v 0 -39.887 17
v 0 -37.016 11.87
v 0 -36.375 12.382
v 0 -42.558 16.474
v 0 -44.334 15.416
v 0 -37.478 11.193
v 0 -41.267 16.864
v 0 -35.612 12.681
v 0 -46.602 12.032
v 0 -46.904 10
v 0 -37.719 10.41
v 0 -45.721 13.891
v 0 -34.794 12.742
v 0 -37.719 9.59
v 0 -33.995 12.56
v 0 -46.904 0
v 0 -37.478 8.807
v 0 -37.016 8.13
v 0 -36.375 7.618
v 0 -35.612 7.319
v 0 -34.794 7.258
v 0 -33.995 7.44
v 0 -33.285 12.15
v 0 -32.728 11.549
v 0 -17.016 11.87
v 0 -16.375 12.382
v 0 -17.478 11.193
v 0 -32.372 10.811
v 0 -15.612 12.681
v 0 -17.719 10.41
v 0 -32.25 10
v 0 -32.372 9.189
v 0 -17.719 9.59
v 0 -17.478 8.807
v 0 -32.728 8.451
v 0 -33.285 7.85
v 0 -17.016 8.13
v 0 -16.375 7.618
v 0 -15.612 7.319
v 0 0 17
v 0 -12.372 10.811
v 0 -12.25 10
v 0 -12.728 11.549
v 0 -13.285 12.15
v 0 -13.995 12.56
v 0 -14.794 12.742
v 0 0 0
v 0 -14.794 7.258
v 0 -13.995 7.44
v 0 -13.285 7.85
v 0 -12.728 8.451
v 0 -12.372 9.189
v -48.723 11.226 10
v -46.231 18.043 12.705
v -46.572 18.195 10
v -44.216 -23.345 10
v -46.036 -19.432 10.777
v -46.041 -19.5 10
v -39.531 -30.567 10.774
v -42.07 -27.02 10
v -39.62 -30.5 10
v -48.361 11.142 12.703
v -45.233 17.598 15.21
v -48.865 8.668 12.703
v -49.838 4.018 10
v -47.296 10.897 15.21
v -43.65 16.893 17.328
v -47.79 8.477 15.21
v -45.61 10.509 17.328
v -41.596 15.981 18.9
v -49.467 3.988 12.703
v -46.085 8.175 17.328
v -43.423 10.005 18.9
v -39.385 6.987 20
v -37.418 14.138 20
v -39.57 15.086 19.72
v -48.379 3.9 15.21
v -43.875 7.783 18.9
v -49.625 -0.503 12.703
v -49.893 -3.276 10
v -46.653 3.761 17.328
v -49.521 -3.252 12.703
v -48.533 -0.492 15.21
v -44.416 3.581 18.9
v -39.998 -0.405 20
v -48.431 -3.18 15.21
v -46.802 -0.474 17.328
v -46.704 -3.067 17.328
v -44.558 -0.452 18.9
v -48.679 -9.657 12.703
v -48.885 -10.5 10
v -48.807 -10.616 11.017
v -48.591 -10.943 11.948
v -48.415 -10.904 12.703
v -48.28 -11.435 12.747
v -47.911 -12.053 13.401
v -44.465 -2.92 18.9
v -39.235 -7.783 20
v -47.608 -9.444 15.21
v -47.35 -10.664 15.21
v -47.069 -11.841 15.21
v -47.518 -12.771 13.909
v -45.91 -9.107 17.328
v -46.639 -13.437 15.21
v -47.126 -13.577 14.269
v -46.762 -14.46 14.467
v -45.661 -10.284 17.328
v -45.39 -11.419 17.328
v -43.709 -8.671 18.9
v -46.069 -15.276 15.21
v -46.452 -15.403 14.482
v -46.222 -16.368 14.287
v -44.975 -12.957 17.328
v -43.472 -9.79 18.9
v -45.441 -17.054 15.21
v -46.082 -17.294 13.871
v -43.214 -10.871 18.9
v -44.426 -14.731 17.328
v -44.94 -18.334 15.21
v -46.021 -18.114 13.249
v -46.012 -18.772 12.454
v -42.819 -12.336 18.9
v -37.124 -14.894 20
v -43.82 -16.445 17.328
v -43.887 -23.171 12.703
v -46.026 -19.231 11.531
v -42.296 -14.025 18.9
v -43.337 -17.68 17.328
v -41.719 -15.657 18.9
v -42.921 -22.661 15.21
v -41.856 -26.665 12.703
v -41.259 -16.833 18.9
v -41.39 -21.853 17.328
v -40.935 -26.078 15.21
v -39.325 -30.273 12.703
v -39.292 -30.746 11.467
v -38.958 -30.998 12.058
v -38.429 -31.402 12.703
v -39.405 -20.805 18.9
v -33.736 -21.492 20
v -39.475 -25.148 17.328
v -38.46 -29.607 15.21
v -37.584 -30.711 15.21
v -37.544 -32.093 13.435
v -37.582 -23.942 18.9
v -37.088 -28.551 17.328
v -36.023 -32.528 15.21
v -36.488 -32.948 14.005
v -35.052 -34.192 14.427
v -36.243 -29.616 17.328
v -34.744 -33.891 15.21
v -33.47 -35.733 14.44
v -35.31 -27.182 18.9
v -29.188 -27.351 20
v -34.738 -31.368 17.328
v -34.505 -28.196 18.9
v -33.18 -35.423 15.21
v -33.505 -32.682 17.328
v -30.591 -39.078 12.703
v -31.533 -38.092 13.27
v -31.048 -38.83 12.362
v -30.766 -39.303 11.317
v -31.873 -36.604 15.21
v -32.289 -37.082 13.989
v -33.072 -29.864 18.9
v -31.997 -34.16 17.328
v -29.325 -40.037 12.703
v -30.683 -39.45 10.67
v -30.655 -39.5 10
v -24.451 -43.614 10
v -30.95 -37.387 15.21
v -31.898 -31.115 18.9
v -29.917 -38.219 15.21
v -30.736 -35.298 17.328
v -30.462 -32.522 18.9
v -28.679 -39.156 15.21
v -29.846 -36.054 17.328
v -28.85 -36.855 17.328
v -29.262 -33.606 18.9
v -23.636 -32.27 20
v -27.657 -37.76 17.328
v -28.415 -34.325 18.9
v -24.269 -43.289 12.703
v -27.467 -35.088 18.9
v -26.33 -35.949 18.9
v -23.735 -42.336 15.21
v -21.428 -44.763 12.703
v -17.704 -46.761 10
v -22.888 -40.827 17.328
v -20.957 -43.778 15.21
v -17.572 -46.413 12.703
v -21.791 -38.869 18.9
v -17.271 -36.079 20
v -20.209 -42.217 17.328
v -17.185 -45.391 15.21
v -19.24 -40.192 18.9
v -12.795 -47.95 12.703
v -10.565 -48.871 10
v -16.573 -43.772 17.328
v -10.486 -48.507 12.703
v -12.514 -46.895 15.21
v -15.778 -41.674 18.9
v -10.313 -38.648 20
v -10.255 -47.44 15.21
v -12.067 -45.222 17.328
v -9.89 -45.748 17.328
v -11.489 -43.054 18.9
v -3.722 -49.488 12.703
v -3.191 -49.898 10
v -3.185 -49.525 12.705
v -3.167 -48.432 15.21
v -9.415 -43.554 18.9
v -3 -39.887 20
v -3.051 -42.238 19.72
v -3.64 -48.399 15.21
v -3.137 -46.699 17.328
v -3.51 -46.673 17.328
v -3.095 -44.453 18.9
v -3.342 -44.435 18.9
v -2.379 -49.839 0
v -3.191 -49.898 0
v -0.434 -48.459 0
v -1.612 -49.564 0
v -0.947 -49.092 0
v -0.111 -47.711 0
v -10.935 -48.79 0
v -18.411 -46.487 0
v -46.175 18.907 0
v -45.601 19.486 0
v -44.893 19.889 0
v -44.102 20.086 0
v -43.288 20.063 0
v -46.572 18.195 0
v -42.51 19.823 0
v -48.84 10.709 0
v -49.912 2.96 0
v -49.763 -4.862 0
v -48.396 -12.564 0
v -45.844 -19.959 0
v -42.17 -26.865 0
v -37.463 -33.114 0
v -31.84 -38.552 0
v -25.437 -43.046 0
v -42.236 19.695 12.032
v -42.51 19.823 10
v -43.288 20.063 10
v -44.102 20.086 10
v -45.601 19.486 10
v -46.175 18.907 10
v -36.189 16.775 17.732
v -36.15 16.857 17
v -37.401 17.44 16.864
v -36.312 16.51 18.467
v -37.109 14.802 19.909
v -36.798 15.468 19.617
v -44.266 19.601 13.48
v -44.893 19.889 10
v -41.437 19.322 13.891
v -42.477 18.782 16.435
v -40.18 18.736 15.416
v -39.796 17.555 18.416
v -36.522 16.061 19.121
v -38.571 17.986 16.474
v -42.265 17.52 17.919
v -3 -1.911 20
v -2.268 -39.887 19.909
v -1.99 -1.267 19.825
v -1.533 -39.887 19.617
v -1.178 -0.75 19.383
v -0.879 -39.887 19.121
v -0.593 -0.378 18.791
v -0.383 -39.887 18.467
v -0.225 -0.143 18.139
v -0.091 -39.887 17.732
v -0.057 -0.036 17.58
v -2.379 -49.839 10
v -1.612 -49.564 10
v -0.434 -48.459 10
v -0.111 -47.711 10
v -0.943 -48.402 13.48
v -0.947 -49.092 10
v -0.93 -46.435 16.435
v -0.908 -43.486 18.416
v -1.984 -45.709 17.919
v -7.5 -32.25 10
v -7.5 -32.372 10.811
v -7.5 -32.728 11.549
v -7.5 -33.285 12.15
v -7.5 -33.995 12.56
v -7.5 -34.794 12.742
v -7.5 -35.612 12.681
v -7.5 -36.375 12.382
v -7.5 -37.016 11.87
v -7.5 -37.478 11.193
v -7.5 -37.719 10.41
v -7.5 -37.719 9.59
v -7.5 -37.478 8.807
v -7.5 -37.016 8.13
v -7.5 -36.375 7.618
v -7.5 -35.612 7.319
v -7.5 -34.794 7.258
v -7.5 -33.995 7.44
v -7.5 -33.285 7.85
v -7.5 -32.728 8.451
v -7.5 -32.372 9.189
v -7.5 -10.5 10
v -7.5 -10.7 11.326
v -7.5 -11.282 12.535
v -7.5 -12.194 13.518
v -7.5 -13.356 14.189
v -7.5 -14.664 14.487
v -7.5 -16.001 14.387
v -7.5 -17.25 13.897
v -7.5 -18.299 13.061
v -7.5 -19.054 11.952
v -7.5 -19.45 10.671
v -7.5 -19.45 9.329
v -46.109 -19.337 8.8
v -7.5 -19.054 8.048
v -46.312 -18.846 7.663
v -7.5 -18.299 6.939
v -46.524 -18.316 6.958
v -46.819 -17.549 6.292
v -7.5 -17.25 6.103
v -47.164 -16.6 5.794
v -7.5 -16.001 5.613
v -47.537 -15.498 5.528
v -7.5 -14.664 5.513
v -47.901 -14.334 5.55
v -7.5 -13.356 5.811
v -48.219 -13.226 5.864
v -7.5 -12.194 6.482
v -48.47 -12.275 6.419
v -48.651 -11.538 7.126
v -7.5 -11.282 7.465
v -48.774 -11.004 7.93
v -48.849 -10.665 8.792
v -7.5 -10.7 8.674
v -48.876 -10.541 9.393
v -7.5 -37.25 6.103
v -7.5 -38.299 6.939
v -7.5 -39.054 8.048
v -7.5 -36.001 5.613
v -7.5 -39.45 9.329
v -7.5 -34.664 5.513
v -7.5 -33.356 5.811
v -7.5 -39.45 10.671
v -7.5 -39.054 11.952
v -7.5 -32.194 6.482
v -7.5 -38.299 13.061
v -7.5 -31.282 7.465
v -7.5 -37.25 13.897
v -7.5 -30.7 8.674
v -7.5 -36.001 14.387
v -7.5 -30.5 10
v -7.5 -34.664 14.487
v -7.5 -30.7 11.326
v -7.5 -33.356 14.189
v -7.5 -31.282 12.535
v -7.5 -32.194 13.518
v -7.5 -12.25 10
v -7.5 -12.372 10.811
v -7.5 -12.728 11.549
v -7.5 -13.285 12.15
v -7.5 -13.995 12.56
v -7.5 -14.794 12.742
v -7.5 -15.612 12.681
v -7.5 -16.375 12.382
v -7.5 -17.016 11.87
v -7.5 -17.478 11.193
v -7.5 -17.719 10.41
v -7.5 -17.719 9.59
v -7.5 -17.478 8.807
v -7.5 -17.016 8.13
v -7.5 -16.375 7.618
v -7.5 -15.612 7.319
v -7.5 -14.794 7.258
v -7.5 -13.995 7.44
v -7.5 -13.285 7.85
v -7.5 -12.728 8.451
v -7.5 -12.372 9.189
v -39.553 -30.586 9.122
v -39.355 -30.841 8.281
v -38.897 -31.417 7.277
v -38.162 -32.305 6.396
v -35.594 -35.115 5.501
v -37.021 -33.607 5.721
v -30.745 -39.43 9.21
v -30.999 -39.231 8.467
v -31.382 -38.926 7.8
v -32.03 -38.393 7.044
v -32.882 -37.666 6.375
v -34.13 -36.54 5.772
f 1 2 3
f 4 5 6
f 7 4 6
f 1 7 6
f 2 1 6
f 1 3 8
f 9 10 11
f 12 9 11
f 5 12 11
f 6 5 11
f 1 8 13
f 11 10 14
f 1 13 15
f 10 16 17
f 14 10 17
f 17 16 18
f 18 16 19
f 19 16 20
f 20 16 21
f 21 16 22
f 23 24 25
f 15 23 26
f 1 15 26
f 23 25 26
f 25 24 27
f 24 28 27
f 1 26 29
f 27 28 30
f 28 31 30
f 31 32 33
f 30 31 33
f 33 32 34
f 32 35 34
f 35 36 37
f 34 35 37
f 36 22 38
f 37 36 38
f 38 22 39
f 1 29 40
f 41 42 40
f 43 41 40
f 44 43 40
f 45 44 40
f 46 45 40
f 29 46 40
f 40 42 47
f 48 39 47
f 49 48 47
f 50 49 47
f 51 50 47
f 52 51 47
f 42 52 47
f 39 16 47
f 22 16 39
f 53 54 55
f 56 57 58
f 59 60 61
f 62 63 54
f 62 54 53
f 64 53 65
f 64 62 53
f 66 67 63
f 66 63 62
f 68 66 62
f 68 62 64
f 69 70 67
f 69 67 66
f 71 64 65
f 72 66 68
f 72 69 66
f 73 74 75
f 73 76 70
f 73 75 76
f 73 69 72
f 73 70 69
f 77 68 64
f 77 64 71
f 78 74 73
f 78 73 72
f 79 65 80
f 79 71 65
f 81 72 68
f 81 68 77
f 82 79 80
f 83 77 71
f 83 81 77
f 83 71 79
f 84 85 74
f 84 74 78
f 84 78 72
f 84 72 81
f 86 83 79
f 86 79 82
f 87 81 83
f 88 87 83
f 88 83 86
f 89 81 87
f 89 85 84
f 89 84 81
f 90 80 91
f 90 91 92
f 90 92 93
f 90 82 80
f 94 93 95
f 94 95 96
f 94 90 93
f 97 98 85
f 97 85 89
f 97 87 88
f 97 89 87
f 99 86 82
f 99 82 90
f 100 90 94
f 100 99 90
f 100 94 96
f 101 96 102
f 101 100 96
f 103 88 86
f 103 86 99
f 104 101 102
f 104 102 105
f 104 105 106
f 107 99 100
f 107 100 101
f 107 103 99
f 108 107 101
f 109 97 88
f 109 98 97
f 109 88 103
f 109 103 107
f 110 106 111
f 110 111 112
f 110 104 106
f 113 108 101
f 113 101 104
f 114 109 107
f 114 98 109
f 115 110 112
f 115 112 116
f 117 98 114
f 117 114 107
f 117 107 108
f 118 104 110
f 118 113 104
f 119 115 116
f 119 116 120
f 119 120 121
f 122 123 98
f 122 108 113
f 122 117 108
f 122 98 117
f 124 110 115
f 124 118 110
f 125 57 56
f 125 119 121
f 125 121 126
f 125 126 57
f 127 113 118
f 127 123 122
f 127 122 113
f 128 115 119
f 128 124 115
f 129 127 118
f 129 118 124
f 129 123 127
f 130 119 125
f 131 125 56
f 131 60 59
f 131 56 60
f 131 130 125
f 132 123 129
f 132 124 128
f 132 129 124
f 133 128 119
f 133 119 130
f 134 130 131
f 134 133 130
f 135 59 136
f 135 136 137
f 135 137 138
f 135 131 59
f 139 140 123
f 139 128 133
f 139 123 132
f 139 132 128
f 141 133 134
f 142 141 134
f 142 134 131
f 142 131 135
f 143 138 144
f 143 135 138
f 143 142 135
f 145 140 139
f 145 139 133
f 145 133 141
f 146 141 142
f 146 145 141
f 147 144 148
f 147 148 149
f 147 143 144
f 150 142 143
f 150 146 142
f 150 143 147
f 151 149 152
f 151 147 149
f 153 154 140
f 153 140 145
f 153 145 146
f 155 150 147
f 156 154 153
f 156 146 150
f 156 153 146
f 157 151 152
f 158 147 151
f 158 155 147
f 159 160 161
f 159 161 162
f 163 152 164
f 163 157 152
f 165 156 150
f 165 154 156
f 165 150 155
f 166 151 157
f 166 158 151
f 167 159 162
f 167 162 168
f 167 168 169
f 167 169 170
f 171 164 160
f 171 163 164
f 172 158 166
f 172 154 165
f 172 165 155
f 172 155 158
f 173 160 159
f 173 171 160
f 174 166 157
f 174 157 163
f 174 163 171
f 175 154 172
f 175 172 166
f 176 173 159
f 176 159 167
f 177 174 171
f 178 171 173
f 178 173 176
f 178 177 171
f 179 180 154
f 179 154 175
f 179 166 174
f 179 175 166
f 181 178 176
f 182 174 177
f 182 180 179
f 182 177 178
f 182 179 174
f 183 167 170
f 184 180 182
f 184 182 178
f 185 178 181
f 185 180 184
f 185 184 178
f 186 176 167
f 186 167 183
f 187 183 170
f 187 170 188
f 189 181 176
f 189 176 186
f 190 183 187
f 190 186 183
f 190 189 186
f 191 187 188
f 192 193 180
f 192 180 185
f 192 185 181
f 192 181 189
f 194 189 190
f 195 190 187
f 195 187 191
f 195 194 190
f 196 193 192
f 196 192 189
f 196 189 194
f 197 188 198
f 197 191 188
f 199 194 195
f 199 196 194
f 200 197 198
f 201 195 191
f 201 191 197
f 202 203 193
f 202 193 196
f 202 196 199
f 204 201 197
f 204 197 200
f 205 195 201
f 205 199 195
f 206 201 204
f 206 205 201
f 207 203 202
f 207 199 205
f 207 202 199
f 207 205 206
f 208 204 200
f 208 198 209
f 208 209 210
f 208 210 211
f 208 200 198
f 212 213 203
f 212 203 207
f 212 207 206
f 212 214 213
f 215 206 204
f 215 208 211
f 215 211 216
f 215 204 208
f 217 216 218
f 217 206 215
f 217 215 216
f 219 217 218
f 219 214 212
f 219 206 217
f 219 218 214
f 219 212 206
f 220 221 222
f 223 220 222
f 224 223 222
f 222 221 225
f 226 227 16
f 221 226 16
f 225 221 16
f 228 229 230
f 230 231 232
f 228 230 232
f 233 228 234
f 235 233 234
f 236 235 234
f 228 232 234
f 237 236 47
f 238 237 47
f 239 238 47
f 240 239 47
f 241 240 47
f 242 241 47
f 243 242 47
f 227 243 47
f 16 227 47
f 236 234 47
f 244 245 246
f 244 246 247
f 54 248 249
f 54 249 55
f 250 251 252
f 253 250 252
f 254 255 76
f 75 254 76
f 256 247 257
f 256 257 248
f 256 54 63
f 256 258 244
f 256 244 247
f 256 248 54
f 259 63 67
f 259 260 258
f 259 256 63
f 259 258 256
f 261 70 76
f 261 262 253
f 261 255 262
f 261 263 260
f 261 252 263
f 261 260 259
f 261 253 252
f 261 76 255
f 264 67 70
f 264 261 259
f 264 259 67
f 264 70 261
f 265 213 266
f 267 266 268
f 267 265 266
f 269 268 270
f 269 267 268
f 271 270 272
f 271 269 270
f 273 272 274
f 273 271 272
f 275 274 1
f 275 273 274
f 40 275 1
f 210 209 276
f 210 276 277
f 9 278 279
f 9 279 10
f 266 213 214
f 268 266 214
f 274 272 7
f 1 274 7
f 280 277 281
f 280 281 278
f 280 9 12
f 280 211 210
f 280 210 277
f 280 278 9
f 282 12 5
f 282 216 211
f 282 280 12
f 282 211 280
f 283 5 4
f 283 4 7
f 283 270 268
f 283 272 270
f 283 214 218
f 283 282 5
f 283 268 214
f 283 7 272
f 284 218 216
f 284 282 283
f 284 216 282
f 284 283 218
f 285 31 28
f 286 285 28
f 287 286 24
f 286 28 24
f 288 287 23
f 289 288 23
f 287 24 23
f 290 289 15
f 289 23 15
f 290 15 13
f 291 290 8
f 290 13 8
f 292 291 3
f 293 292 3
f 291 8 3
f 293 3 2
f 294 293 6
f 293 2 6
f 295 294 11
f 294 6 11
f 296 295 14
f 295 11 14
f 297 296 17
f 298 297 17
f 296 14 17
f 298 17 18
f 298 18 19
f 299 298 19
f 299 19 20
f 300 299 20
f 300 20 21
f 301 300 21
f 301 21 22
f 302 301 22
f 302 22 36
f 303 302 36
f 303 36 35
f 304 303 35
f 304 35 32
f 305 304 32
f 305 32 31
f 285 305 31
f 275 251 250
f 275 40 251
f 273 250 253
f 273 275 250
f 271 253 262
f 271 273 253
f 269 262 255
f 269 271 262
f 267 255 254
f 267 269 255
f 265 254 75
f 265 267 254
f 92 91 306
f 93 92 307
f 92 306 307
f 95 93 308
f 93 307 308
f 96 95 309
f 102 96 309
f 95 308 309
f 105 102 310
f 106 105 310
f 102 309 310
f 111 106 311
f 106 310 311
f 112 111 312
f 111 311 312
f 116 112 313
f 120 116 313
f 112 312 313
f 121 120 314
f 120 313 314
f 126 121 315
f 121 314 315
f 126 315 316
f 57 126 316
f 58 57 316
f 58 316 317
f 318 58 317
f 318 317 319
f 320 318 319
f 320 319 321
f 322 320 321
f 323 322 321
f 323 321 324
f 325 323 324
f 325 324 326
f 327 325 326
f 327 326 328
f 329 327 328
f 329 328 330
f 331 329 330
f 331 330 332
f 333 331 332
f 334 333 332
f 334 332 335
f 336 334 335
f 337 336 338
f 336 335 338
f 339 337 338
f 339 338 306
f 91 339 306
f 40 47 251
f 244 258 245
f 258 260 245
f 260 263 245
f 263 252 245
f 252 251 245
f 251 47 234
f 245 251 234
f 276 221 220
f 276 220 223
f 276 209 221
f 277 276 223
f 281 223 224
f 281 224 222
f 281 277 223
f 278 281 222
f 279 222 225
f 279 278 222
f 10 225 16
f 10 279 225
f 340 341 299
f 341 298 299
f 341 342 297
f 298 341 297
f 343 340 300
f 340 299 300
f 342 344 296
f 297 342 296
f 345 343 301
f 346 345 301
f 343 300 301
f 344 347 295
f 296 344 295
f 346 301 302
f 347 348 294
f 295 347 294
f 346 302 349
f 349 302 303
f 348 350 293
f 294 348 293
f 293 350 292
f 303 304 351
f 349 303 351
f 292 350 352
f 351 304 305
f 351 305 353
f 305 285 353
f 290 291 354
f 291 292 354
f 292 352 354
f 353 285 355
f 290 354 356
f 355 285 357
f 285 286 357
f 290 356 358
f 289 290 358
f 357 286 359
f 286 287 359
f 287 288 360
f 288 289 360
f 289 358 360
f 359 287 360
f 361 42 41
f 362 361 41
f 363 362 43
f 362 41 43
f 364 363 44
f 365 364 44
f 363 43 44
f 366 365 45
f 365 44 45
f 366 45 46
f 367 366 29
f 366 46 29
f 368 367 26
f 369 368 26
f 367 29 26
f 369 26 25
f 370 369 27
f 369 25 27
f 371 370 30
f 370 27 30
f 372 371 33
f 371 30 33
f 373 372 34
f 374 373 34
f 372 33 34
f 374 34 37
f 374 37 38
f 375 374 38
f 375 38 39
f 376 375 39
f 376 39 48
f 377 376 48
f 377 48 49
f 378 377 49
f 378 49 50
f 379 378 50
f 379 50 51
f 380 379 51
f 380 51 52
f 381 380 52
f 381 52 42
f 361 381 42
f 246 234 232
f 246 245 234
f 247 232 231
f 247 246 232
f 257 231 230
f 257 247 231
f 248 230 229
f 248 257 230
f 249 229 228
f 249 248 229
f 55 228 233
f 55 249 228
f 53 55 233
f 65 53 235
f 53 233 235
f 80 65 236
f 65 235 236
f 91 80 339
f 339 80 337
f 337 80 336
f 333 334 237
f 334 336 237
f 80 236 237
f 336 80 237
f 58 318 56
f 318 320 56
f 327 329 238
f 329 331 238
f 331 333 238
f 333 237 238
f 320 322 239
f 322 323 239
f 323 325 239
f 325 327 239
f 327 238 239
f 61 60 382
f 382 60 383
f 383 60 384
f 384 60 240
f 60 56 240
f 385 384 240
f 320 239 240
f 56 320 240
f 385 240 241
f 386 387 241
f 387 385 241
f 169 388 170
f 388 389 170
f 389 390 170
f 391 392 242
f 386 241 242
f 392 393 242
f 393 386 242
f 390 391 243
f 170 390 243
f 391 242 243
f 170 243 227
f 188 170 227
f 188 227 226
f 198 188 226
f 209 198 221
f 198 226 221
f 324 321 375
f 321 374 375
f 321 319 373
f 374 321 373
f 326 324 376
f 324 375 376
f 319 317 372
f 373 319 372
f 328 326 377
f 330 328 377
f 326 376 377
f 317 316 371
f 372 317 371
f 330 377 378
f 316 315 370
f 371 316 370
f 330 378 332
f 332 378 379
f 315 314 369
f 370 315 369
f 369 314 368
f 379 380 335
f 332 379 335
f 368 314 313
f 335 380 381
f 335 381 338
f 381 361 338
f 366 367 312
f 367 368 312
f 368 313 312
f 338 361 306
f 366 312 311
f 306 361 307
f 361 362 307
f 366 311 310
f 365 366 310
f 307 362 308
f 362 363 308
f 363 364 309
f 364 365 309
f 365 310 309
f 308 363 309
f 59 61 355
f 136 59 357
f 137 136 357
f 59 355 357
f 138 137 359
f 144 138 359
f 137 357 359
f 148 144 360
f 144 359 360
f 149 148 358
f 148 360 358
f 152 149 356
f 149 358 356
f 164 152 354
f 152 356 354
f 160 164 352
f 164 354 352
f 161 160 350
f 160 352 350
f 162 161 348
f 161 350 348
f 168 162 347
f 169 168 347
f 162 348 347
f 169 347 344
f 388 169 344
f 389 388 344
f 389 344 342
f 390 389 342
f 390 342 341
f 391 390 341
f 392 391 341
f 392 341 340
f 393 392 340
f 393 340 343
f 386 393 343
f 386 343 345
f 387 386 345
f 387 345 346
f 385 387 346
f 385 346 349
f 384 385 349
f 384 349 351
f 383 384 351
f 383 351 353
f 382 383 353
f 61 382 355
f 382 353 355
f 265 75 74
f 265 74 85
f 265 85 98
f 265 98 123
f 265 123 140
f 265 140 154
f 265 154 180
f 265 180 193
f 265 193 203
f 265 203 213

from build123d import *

# Parameters (mm, degrees)
BOSS_EXTRUDE1_DEPTH     = 20
CUT_EXTRUDE1_REACH      = 75.485
CUT_EXTRUDE1_END_RADIUS = 50
SKETCH3_R               = 2.75
CUT_EXTRUDE2_REACH      = 70.602
CUT_EXTRUDE2_END_RADIUS = 50
SKETCH4_R               = 4.5
FILLET1_R               = 10
FILLET2_R               = 3


with BuildPart() as part:
    # Sketch2 → Boss-Extrude1 (new body)
    with BuildSketch(Plane.XY):
        with BuildLine():
            Line((0, 0), (-45.315389352, 21.130913087))
            ThreePointArc((-45.315389352, 21.130913087), (-42.169572291, -26.864980417), (0, -50))
            Line((0, -50), (0, 0))
        make_face()
    extrude(amount=BOSS_EXTRUDE1_DEPTH)

    # Cut-Extrude1: up to this cylinder (the profile starts inside it)
    cut_extrude1_end = Plane(origin=(0, 0, 10), z_dir=(0, 0, -1)) * Cylinder(CUT_EXTRUDE1_END_RADIUS, 251.97, mode=Mode.PRIVATE)
    # Sketch3 → Cut-Extrude1 (cut, up to the surface)
    with BuildSketch(Plane(origin=(0, 0, 0), x_dir=(0, 0, -1), z_dir=(1, 0, 0)), mode=Mode.PRIVATE) as cut_extrude1_sk1:
        with Locations(Location((-10, -35, 0), (0, 0, 90))):
            Circle(SKETCH3_R)
    cut_extrude1_tool1 = extrude(cut_extrude1_sk1.sketch, amount=-CUT_EXTRUDE1_REACH, mode=Mode.PRIVATE) & cut_extrude1_end
    add(cut_extrude1_tool1.solids().sort_by_distance((0, -35, 10))[0], mode=Mode.SUBTRACT)
    # Sketch3 → Cut-Extrude1 (cut, up to the surface)
    with BuildSketch(Plane(origin=(0, 0, 0), x_dir=(0, 0, -1), z_dir=(1, 0, 0)), mode=Mode.PRIVATE) as cut_extrude1_sk2:
        with Locations(Location((-10, -15, 0), (0, 0, 90))):
            Circle(SKETCH3_R)
    cut_extrude1_tool2 = extrude(cut_extrude1_sk2.sketch, amount=-CUT_EXTRUDE1_REACH, mode=Mode.PRIVATE) & cut_extrude1_end
    add(cut_extrude1_tool2.solids().sort_by_distance((0, -15, 10))[0], mode=Mode.SUBTRACT)

    # Cut-Extrude2: up to this cylinder (the profile starts inside it)
    cut_extrude2_end = Plane(origin=(0, 0, 10), z_dir=(0, 0, -1)) * Cylinder(CUT_EXTRUDE2_END_RADIUS, 242.204, mode=Mode.PRIVATE)
    # Sketch4 → Cut-Extrude2 (cut, up to the surface)
    with BuildSketch(Plane(origin=(-7.5, 0, 0), x_dir=(0, 0, -1), z_dir=(1, 0, 0)), mode=Mode.PRIVATE) as cut_extrude2_sk1:
        with Locations(Location((-10, -15, 0), (0, 0, 90))):
            Circle(SKETCH4_R)
    cut_extrude2_tool1 = extrude(cut_extrude2_sk1.sketch, amount=-CUT_EXTRUDE2_REACH, mode=Mode.PRIVATE) & cut_extrude2_end
    add(cut_extrude2_tool1.solids().sort_by_distance((-7.5, -15, 10))[0], mode=Mode.SUBTRACT)
    # Sketch4 → Cut-Extrude2 (cut, up to the surface)
    with BuildSketch(Plane(origin=(-7.5, 0, 0), x_dir=(0, 0, -1), z_dir=(1, 0, 0)), mode=Mode.PRIVATE) as cut_extrude2_sk2:
        with Locations(Location((-10, -35, 0), (0, 0, 90))):
            Circle(SKETCH4_R)
    cut_extrude2_tool2 = extrude(cut_extrude2_sk2.sketch, amount=-CUT_EXTRUDE2_REACH, mode=Mode.PRIVATE) & cut_extrude2_end
    add(cut_extrude2_tool2.solids().sort_by_distance((-7.5, -35, 10))[0], mode=Mode.SUBTRACT)

    # Fillet1
    # the kernel refuses this fillet: 10 mm, written as the material it takes off along each edge
    with BuildSketch(Plane(origin=(0, 0, 20), x_dir=(-0.5924817254083071, 0.8055838907632124, 0), z_dir=(0.8055838907632124, 0.5924817254083071, 0))) as fillet1_piece_1:
        with BuildLine():
            CenterArc((50 - FILLET1_R, -FILLET1_R), FILLET1_R, 0, 90)
            Line((50 - FILLET1_R, 0), (50, 0))
            Line((50, 0), (50, -FILLET1_R))
        make_face()
    revolve(axis=Axis((0, 0, 20), (0, 0, 1)), revolution_arc=172.333365089, mode=Mode.SUBTRACT)

    # Fillet2
    fillet2_edges = [part.edges().sort_by_distance(p)[0] for p in [
        (0, -20, 20),
        (0, -50, 5),
        (0, -47.071067812, 17.071067812),
        (-45.315389352, 21.130913087, 5),
        (-42.660875302, 19.893092857, 17.071067812),
        (-18.126155741, 8.452365235, 20),
    ]]
    fillet(fillet2_edges, radius=FILLET2_R)


solid = part.part
